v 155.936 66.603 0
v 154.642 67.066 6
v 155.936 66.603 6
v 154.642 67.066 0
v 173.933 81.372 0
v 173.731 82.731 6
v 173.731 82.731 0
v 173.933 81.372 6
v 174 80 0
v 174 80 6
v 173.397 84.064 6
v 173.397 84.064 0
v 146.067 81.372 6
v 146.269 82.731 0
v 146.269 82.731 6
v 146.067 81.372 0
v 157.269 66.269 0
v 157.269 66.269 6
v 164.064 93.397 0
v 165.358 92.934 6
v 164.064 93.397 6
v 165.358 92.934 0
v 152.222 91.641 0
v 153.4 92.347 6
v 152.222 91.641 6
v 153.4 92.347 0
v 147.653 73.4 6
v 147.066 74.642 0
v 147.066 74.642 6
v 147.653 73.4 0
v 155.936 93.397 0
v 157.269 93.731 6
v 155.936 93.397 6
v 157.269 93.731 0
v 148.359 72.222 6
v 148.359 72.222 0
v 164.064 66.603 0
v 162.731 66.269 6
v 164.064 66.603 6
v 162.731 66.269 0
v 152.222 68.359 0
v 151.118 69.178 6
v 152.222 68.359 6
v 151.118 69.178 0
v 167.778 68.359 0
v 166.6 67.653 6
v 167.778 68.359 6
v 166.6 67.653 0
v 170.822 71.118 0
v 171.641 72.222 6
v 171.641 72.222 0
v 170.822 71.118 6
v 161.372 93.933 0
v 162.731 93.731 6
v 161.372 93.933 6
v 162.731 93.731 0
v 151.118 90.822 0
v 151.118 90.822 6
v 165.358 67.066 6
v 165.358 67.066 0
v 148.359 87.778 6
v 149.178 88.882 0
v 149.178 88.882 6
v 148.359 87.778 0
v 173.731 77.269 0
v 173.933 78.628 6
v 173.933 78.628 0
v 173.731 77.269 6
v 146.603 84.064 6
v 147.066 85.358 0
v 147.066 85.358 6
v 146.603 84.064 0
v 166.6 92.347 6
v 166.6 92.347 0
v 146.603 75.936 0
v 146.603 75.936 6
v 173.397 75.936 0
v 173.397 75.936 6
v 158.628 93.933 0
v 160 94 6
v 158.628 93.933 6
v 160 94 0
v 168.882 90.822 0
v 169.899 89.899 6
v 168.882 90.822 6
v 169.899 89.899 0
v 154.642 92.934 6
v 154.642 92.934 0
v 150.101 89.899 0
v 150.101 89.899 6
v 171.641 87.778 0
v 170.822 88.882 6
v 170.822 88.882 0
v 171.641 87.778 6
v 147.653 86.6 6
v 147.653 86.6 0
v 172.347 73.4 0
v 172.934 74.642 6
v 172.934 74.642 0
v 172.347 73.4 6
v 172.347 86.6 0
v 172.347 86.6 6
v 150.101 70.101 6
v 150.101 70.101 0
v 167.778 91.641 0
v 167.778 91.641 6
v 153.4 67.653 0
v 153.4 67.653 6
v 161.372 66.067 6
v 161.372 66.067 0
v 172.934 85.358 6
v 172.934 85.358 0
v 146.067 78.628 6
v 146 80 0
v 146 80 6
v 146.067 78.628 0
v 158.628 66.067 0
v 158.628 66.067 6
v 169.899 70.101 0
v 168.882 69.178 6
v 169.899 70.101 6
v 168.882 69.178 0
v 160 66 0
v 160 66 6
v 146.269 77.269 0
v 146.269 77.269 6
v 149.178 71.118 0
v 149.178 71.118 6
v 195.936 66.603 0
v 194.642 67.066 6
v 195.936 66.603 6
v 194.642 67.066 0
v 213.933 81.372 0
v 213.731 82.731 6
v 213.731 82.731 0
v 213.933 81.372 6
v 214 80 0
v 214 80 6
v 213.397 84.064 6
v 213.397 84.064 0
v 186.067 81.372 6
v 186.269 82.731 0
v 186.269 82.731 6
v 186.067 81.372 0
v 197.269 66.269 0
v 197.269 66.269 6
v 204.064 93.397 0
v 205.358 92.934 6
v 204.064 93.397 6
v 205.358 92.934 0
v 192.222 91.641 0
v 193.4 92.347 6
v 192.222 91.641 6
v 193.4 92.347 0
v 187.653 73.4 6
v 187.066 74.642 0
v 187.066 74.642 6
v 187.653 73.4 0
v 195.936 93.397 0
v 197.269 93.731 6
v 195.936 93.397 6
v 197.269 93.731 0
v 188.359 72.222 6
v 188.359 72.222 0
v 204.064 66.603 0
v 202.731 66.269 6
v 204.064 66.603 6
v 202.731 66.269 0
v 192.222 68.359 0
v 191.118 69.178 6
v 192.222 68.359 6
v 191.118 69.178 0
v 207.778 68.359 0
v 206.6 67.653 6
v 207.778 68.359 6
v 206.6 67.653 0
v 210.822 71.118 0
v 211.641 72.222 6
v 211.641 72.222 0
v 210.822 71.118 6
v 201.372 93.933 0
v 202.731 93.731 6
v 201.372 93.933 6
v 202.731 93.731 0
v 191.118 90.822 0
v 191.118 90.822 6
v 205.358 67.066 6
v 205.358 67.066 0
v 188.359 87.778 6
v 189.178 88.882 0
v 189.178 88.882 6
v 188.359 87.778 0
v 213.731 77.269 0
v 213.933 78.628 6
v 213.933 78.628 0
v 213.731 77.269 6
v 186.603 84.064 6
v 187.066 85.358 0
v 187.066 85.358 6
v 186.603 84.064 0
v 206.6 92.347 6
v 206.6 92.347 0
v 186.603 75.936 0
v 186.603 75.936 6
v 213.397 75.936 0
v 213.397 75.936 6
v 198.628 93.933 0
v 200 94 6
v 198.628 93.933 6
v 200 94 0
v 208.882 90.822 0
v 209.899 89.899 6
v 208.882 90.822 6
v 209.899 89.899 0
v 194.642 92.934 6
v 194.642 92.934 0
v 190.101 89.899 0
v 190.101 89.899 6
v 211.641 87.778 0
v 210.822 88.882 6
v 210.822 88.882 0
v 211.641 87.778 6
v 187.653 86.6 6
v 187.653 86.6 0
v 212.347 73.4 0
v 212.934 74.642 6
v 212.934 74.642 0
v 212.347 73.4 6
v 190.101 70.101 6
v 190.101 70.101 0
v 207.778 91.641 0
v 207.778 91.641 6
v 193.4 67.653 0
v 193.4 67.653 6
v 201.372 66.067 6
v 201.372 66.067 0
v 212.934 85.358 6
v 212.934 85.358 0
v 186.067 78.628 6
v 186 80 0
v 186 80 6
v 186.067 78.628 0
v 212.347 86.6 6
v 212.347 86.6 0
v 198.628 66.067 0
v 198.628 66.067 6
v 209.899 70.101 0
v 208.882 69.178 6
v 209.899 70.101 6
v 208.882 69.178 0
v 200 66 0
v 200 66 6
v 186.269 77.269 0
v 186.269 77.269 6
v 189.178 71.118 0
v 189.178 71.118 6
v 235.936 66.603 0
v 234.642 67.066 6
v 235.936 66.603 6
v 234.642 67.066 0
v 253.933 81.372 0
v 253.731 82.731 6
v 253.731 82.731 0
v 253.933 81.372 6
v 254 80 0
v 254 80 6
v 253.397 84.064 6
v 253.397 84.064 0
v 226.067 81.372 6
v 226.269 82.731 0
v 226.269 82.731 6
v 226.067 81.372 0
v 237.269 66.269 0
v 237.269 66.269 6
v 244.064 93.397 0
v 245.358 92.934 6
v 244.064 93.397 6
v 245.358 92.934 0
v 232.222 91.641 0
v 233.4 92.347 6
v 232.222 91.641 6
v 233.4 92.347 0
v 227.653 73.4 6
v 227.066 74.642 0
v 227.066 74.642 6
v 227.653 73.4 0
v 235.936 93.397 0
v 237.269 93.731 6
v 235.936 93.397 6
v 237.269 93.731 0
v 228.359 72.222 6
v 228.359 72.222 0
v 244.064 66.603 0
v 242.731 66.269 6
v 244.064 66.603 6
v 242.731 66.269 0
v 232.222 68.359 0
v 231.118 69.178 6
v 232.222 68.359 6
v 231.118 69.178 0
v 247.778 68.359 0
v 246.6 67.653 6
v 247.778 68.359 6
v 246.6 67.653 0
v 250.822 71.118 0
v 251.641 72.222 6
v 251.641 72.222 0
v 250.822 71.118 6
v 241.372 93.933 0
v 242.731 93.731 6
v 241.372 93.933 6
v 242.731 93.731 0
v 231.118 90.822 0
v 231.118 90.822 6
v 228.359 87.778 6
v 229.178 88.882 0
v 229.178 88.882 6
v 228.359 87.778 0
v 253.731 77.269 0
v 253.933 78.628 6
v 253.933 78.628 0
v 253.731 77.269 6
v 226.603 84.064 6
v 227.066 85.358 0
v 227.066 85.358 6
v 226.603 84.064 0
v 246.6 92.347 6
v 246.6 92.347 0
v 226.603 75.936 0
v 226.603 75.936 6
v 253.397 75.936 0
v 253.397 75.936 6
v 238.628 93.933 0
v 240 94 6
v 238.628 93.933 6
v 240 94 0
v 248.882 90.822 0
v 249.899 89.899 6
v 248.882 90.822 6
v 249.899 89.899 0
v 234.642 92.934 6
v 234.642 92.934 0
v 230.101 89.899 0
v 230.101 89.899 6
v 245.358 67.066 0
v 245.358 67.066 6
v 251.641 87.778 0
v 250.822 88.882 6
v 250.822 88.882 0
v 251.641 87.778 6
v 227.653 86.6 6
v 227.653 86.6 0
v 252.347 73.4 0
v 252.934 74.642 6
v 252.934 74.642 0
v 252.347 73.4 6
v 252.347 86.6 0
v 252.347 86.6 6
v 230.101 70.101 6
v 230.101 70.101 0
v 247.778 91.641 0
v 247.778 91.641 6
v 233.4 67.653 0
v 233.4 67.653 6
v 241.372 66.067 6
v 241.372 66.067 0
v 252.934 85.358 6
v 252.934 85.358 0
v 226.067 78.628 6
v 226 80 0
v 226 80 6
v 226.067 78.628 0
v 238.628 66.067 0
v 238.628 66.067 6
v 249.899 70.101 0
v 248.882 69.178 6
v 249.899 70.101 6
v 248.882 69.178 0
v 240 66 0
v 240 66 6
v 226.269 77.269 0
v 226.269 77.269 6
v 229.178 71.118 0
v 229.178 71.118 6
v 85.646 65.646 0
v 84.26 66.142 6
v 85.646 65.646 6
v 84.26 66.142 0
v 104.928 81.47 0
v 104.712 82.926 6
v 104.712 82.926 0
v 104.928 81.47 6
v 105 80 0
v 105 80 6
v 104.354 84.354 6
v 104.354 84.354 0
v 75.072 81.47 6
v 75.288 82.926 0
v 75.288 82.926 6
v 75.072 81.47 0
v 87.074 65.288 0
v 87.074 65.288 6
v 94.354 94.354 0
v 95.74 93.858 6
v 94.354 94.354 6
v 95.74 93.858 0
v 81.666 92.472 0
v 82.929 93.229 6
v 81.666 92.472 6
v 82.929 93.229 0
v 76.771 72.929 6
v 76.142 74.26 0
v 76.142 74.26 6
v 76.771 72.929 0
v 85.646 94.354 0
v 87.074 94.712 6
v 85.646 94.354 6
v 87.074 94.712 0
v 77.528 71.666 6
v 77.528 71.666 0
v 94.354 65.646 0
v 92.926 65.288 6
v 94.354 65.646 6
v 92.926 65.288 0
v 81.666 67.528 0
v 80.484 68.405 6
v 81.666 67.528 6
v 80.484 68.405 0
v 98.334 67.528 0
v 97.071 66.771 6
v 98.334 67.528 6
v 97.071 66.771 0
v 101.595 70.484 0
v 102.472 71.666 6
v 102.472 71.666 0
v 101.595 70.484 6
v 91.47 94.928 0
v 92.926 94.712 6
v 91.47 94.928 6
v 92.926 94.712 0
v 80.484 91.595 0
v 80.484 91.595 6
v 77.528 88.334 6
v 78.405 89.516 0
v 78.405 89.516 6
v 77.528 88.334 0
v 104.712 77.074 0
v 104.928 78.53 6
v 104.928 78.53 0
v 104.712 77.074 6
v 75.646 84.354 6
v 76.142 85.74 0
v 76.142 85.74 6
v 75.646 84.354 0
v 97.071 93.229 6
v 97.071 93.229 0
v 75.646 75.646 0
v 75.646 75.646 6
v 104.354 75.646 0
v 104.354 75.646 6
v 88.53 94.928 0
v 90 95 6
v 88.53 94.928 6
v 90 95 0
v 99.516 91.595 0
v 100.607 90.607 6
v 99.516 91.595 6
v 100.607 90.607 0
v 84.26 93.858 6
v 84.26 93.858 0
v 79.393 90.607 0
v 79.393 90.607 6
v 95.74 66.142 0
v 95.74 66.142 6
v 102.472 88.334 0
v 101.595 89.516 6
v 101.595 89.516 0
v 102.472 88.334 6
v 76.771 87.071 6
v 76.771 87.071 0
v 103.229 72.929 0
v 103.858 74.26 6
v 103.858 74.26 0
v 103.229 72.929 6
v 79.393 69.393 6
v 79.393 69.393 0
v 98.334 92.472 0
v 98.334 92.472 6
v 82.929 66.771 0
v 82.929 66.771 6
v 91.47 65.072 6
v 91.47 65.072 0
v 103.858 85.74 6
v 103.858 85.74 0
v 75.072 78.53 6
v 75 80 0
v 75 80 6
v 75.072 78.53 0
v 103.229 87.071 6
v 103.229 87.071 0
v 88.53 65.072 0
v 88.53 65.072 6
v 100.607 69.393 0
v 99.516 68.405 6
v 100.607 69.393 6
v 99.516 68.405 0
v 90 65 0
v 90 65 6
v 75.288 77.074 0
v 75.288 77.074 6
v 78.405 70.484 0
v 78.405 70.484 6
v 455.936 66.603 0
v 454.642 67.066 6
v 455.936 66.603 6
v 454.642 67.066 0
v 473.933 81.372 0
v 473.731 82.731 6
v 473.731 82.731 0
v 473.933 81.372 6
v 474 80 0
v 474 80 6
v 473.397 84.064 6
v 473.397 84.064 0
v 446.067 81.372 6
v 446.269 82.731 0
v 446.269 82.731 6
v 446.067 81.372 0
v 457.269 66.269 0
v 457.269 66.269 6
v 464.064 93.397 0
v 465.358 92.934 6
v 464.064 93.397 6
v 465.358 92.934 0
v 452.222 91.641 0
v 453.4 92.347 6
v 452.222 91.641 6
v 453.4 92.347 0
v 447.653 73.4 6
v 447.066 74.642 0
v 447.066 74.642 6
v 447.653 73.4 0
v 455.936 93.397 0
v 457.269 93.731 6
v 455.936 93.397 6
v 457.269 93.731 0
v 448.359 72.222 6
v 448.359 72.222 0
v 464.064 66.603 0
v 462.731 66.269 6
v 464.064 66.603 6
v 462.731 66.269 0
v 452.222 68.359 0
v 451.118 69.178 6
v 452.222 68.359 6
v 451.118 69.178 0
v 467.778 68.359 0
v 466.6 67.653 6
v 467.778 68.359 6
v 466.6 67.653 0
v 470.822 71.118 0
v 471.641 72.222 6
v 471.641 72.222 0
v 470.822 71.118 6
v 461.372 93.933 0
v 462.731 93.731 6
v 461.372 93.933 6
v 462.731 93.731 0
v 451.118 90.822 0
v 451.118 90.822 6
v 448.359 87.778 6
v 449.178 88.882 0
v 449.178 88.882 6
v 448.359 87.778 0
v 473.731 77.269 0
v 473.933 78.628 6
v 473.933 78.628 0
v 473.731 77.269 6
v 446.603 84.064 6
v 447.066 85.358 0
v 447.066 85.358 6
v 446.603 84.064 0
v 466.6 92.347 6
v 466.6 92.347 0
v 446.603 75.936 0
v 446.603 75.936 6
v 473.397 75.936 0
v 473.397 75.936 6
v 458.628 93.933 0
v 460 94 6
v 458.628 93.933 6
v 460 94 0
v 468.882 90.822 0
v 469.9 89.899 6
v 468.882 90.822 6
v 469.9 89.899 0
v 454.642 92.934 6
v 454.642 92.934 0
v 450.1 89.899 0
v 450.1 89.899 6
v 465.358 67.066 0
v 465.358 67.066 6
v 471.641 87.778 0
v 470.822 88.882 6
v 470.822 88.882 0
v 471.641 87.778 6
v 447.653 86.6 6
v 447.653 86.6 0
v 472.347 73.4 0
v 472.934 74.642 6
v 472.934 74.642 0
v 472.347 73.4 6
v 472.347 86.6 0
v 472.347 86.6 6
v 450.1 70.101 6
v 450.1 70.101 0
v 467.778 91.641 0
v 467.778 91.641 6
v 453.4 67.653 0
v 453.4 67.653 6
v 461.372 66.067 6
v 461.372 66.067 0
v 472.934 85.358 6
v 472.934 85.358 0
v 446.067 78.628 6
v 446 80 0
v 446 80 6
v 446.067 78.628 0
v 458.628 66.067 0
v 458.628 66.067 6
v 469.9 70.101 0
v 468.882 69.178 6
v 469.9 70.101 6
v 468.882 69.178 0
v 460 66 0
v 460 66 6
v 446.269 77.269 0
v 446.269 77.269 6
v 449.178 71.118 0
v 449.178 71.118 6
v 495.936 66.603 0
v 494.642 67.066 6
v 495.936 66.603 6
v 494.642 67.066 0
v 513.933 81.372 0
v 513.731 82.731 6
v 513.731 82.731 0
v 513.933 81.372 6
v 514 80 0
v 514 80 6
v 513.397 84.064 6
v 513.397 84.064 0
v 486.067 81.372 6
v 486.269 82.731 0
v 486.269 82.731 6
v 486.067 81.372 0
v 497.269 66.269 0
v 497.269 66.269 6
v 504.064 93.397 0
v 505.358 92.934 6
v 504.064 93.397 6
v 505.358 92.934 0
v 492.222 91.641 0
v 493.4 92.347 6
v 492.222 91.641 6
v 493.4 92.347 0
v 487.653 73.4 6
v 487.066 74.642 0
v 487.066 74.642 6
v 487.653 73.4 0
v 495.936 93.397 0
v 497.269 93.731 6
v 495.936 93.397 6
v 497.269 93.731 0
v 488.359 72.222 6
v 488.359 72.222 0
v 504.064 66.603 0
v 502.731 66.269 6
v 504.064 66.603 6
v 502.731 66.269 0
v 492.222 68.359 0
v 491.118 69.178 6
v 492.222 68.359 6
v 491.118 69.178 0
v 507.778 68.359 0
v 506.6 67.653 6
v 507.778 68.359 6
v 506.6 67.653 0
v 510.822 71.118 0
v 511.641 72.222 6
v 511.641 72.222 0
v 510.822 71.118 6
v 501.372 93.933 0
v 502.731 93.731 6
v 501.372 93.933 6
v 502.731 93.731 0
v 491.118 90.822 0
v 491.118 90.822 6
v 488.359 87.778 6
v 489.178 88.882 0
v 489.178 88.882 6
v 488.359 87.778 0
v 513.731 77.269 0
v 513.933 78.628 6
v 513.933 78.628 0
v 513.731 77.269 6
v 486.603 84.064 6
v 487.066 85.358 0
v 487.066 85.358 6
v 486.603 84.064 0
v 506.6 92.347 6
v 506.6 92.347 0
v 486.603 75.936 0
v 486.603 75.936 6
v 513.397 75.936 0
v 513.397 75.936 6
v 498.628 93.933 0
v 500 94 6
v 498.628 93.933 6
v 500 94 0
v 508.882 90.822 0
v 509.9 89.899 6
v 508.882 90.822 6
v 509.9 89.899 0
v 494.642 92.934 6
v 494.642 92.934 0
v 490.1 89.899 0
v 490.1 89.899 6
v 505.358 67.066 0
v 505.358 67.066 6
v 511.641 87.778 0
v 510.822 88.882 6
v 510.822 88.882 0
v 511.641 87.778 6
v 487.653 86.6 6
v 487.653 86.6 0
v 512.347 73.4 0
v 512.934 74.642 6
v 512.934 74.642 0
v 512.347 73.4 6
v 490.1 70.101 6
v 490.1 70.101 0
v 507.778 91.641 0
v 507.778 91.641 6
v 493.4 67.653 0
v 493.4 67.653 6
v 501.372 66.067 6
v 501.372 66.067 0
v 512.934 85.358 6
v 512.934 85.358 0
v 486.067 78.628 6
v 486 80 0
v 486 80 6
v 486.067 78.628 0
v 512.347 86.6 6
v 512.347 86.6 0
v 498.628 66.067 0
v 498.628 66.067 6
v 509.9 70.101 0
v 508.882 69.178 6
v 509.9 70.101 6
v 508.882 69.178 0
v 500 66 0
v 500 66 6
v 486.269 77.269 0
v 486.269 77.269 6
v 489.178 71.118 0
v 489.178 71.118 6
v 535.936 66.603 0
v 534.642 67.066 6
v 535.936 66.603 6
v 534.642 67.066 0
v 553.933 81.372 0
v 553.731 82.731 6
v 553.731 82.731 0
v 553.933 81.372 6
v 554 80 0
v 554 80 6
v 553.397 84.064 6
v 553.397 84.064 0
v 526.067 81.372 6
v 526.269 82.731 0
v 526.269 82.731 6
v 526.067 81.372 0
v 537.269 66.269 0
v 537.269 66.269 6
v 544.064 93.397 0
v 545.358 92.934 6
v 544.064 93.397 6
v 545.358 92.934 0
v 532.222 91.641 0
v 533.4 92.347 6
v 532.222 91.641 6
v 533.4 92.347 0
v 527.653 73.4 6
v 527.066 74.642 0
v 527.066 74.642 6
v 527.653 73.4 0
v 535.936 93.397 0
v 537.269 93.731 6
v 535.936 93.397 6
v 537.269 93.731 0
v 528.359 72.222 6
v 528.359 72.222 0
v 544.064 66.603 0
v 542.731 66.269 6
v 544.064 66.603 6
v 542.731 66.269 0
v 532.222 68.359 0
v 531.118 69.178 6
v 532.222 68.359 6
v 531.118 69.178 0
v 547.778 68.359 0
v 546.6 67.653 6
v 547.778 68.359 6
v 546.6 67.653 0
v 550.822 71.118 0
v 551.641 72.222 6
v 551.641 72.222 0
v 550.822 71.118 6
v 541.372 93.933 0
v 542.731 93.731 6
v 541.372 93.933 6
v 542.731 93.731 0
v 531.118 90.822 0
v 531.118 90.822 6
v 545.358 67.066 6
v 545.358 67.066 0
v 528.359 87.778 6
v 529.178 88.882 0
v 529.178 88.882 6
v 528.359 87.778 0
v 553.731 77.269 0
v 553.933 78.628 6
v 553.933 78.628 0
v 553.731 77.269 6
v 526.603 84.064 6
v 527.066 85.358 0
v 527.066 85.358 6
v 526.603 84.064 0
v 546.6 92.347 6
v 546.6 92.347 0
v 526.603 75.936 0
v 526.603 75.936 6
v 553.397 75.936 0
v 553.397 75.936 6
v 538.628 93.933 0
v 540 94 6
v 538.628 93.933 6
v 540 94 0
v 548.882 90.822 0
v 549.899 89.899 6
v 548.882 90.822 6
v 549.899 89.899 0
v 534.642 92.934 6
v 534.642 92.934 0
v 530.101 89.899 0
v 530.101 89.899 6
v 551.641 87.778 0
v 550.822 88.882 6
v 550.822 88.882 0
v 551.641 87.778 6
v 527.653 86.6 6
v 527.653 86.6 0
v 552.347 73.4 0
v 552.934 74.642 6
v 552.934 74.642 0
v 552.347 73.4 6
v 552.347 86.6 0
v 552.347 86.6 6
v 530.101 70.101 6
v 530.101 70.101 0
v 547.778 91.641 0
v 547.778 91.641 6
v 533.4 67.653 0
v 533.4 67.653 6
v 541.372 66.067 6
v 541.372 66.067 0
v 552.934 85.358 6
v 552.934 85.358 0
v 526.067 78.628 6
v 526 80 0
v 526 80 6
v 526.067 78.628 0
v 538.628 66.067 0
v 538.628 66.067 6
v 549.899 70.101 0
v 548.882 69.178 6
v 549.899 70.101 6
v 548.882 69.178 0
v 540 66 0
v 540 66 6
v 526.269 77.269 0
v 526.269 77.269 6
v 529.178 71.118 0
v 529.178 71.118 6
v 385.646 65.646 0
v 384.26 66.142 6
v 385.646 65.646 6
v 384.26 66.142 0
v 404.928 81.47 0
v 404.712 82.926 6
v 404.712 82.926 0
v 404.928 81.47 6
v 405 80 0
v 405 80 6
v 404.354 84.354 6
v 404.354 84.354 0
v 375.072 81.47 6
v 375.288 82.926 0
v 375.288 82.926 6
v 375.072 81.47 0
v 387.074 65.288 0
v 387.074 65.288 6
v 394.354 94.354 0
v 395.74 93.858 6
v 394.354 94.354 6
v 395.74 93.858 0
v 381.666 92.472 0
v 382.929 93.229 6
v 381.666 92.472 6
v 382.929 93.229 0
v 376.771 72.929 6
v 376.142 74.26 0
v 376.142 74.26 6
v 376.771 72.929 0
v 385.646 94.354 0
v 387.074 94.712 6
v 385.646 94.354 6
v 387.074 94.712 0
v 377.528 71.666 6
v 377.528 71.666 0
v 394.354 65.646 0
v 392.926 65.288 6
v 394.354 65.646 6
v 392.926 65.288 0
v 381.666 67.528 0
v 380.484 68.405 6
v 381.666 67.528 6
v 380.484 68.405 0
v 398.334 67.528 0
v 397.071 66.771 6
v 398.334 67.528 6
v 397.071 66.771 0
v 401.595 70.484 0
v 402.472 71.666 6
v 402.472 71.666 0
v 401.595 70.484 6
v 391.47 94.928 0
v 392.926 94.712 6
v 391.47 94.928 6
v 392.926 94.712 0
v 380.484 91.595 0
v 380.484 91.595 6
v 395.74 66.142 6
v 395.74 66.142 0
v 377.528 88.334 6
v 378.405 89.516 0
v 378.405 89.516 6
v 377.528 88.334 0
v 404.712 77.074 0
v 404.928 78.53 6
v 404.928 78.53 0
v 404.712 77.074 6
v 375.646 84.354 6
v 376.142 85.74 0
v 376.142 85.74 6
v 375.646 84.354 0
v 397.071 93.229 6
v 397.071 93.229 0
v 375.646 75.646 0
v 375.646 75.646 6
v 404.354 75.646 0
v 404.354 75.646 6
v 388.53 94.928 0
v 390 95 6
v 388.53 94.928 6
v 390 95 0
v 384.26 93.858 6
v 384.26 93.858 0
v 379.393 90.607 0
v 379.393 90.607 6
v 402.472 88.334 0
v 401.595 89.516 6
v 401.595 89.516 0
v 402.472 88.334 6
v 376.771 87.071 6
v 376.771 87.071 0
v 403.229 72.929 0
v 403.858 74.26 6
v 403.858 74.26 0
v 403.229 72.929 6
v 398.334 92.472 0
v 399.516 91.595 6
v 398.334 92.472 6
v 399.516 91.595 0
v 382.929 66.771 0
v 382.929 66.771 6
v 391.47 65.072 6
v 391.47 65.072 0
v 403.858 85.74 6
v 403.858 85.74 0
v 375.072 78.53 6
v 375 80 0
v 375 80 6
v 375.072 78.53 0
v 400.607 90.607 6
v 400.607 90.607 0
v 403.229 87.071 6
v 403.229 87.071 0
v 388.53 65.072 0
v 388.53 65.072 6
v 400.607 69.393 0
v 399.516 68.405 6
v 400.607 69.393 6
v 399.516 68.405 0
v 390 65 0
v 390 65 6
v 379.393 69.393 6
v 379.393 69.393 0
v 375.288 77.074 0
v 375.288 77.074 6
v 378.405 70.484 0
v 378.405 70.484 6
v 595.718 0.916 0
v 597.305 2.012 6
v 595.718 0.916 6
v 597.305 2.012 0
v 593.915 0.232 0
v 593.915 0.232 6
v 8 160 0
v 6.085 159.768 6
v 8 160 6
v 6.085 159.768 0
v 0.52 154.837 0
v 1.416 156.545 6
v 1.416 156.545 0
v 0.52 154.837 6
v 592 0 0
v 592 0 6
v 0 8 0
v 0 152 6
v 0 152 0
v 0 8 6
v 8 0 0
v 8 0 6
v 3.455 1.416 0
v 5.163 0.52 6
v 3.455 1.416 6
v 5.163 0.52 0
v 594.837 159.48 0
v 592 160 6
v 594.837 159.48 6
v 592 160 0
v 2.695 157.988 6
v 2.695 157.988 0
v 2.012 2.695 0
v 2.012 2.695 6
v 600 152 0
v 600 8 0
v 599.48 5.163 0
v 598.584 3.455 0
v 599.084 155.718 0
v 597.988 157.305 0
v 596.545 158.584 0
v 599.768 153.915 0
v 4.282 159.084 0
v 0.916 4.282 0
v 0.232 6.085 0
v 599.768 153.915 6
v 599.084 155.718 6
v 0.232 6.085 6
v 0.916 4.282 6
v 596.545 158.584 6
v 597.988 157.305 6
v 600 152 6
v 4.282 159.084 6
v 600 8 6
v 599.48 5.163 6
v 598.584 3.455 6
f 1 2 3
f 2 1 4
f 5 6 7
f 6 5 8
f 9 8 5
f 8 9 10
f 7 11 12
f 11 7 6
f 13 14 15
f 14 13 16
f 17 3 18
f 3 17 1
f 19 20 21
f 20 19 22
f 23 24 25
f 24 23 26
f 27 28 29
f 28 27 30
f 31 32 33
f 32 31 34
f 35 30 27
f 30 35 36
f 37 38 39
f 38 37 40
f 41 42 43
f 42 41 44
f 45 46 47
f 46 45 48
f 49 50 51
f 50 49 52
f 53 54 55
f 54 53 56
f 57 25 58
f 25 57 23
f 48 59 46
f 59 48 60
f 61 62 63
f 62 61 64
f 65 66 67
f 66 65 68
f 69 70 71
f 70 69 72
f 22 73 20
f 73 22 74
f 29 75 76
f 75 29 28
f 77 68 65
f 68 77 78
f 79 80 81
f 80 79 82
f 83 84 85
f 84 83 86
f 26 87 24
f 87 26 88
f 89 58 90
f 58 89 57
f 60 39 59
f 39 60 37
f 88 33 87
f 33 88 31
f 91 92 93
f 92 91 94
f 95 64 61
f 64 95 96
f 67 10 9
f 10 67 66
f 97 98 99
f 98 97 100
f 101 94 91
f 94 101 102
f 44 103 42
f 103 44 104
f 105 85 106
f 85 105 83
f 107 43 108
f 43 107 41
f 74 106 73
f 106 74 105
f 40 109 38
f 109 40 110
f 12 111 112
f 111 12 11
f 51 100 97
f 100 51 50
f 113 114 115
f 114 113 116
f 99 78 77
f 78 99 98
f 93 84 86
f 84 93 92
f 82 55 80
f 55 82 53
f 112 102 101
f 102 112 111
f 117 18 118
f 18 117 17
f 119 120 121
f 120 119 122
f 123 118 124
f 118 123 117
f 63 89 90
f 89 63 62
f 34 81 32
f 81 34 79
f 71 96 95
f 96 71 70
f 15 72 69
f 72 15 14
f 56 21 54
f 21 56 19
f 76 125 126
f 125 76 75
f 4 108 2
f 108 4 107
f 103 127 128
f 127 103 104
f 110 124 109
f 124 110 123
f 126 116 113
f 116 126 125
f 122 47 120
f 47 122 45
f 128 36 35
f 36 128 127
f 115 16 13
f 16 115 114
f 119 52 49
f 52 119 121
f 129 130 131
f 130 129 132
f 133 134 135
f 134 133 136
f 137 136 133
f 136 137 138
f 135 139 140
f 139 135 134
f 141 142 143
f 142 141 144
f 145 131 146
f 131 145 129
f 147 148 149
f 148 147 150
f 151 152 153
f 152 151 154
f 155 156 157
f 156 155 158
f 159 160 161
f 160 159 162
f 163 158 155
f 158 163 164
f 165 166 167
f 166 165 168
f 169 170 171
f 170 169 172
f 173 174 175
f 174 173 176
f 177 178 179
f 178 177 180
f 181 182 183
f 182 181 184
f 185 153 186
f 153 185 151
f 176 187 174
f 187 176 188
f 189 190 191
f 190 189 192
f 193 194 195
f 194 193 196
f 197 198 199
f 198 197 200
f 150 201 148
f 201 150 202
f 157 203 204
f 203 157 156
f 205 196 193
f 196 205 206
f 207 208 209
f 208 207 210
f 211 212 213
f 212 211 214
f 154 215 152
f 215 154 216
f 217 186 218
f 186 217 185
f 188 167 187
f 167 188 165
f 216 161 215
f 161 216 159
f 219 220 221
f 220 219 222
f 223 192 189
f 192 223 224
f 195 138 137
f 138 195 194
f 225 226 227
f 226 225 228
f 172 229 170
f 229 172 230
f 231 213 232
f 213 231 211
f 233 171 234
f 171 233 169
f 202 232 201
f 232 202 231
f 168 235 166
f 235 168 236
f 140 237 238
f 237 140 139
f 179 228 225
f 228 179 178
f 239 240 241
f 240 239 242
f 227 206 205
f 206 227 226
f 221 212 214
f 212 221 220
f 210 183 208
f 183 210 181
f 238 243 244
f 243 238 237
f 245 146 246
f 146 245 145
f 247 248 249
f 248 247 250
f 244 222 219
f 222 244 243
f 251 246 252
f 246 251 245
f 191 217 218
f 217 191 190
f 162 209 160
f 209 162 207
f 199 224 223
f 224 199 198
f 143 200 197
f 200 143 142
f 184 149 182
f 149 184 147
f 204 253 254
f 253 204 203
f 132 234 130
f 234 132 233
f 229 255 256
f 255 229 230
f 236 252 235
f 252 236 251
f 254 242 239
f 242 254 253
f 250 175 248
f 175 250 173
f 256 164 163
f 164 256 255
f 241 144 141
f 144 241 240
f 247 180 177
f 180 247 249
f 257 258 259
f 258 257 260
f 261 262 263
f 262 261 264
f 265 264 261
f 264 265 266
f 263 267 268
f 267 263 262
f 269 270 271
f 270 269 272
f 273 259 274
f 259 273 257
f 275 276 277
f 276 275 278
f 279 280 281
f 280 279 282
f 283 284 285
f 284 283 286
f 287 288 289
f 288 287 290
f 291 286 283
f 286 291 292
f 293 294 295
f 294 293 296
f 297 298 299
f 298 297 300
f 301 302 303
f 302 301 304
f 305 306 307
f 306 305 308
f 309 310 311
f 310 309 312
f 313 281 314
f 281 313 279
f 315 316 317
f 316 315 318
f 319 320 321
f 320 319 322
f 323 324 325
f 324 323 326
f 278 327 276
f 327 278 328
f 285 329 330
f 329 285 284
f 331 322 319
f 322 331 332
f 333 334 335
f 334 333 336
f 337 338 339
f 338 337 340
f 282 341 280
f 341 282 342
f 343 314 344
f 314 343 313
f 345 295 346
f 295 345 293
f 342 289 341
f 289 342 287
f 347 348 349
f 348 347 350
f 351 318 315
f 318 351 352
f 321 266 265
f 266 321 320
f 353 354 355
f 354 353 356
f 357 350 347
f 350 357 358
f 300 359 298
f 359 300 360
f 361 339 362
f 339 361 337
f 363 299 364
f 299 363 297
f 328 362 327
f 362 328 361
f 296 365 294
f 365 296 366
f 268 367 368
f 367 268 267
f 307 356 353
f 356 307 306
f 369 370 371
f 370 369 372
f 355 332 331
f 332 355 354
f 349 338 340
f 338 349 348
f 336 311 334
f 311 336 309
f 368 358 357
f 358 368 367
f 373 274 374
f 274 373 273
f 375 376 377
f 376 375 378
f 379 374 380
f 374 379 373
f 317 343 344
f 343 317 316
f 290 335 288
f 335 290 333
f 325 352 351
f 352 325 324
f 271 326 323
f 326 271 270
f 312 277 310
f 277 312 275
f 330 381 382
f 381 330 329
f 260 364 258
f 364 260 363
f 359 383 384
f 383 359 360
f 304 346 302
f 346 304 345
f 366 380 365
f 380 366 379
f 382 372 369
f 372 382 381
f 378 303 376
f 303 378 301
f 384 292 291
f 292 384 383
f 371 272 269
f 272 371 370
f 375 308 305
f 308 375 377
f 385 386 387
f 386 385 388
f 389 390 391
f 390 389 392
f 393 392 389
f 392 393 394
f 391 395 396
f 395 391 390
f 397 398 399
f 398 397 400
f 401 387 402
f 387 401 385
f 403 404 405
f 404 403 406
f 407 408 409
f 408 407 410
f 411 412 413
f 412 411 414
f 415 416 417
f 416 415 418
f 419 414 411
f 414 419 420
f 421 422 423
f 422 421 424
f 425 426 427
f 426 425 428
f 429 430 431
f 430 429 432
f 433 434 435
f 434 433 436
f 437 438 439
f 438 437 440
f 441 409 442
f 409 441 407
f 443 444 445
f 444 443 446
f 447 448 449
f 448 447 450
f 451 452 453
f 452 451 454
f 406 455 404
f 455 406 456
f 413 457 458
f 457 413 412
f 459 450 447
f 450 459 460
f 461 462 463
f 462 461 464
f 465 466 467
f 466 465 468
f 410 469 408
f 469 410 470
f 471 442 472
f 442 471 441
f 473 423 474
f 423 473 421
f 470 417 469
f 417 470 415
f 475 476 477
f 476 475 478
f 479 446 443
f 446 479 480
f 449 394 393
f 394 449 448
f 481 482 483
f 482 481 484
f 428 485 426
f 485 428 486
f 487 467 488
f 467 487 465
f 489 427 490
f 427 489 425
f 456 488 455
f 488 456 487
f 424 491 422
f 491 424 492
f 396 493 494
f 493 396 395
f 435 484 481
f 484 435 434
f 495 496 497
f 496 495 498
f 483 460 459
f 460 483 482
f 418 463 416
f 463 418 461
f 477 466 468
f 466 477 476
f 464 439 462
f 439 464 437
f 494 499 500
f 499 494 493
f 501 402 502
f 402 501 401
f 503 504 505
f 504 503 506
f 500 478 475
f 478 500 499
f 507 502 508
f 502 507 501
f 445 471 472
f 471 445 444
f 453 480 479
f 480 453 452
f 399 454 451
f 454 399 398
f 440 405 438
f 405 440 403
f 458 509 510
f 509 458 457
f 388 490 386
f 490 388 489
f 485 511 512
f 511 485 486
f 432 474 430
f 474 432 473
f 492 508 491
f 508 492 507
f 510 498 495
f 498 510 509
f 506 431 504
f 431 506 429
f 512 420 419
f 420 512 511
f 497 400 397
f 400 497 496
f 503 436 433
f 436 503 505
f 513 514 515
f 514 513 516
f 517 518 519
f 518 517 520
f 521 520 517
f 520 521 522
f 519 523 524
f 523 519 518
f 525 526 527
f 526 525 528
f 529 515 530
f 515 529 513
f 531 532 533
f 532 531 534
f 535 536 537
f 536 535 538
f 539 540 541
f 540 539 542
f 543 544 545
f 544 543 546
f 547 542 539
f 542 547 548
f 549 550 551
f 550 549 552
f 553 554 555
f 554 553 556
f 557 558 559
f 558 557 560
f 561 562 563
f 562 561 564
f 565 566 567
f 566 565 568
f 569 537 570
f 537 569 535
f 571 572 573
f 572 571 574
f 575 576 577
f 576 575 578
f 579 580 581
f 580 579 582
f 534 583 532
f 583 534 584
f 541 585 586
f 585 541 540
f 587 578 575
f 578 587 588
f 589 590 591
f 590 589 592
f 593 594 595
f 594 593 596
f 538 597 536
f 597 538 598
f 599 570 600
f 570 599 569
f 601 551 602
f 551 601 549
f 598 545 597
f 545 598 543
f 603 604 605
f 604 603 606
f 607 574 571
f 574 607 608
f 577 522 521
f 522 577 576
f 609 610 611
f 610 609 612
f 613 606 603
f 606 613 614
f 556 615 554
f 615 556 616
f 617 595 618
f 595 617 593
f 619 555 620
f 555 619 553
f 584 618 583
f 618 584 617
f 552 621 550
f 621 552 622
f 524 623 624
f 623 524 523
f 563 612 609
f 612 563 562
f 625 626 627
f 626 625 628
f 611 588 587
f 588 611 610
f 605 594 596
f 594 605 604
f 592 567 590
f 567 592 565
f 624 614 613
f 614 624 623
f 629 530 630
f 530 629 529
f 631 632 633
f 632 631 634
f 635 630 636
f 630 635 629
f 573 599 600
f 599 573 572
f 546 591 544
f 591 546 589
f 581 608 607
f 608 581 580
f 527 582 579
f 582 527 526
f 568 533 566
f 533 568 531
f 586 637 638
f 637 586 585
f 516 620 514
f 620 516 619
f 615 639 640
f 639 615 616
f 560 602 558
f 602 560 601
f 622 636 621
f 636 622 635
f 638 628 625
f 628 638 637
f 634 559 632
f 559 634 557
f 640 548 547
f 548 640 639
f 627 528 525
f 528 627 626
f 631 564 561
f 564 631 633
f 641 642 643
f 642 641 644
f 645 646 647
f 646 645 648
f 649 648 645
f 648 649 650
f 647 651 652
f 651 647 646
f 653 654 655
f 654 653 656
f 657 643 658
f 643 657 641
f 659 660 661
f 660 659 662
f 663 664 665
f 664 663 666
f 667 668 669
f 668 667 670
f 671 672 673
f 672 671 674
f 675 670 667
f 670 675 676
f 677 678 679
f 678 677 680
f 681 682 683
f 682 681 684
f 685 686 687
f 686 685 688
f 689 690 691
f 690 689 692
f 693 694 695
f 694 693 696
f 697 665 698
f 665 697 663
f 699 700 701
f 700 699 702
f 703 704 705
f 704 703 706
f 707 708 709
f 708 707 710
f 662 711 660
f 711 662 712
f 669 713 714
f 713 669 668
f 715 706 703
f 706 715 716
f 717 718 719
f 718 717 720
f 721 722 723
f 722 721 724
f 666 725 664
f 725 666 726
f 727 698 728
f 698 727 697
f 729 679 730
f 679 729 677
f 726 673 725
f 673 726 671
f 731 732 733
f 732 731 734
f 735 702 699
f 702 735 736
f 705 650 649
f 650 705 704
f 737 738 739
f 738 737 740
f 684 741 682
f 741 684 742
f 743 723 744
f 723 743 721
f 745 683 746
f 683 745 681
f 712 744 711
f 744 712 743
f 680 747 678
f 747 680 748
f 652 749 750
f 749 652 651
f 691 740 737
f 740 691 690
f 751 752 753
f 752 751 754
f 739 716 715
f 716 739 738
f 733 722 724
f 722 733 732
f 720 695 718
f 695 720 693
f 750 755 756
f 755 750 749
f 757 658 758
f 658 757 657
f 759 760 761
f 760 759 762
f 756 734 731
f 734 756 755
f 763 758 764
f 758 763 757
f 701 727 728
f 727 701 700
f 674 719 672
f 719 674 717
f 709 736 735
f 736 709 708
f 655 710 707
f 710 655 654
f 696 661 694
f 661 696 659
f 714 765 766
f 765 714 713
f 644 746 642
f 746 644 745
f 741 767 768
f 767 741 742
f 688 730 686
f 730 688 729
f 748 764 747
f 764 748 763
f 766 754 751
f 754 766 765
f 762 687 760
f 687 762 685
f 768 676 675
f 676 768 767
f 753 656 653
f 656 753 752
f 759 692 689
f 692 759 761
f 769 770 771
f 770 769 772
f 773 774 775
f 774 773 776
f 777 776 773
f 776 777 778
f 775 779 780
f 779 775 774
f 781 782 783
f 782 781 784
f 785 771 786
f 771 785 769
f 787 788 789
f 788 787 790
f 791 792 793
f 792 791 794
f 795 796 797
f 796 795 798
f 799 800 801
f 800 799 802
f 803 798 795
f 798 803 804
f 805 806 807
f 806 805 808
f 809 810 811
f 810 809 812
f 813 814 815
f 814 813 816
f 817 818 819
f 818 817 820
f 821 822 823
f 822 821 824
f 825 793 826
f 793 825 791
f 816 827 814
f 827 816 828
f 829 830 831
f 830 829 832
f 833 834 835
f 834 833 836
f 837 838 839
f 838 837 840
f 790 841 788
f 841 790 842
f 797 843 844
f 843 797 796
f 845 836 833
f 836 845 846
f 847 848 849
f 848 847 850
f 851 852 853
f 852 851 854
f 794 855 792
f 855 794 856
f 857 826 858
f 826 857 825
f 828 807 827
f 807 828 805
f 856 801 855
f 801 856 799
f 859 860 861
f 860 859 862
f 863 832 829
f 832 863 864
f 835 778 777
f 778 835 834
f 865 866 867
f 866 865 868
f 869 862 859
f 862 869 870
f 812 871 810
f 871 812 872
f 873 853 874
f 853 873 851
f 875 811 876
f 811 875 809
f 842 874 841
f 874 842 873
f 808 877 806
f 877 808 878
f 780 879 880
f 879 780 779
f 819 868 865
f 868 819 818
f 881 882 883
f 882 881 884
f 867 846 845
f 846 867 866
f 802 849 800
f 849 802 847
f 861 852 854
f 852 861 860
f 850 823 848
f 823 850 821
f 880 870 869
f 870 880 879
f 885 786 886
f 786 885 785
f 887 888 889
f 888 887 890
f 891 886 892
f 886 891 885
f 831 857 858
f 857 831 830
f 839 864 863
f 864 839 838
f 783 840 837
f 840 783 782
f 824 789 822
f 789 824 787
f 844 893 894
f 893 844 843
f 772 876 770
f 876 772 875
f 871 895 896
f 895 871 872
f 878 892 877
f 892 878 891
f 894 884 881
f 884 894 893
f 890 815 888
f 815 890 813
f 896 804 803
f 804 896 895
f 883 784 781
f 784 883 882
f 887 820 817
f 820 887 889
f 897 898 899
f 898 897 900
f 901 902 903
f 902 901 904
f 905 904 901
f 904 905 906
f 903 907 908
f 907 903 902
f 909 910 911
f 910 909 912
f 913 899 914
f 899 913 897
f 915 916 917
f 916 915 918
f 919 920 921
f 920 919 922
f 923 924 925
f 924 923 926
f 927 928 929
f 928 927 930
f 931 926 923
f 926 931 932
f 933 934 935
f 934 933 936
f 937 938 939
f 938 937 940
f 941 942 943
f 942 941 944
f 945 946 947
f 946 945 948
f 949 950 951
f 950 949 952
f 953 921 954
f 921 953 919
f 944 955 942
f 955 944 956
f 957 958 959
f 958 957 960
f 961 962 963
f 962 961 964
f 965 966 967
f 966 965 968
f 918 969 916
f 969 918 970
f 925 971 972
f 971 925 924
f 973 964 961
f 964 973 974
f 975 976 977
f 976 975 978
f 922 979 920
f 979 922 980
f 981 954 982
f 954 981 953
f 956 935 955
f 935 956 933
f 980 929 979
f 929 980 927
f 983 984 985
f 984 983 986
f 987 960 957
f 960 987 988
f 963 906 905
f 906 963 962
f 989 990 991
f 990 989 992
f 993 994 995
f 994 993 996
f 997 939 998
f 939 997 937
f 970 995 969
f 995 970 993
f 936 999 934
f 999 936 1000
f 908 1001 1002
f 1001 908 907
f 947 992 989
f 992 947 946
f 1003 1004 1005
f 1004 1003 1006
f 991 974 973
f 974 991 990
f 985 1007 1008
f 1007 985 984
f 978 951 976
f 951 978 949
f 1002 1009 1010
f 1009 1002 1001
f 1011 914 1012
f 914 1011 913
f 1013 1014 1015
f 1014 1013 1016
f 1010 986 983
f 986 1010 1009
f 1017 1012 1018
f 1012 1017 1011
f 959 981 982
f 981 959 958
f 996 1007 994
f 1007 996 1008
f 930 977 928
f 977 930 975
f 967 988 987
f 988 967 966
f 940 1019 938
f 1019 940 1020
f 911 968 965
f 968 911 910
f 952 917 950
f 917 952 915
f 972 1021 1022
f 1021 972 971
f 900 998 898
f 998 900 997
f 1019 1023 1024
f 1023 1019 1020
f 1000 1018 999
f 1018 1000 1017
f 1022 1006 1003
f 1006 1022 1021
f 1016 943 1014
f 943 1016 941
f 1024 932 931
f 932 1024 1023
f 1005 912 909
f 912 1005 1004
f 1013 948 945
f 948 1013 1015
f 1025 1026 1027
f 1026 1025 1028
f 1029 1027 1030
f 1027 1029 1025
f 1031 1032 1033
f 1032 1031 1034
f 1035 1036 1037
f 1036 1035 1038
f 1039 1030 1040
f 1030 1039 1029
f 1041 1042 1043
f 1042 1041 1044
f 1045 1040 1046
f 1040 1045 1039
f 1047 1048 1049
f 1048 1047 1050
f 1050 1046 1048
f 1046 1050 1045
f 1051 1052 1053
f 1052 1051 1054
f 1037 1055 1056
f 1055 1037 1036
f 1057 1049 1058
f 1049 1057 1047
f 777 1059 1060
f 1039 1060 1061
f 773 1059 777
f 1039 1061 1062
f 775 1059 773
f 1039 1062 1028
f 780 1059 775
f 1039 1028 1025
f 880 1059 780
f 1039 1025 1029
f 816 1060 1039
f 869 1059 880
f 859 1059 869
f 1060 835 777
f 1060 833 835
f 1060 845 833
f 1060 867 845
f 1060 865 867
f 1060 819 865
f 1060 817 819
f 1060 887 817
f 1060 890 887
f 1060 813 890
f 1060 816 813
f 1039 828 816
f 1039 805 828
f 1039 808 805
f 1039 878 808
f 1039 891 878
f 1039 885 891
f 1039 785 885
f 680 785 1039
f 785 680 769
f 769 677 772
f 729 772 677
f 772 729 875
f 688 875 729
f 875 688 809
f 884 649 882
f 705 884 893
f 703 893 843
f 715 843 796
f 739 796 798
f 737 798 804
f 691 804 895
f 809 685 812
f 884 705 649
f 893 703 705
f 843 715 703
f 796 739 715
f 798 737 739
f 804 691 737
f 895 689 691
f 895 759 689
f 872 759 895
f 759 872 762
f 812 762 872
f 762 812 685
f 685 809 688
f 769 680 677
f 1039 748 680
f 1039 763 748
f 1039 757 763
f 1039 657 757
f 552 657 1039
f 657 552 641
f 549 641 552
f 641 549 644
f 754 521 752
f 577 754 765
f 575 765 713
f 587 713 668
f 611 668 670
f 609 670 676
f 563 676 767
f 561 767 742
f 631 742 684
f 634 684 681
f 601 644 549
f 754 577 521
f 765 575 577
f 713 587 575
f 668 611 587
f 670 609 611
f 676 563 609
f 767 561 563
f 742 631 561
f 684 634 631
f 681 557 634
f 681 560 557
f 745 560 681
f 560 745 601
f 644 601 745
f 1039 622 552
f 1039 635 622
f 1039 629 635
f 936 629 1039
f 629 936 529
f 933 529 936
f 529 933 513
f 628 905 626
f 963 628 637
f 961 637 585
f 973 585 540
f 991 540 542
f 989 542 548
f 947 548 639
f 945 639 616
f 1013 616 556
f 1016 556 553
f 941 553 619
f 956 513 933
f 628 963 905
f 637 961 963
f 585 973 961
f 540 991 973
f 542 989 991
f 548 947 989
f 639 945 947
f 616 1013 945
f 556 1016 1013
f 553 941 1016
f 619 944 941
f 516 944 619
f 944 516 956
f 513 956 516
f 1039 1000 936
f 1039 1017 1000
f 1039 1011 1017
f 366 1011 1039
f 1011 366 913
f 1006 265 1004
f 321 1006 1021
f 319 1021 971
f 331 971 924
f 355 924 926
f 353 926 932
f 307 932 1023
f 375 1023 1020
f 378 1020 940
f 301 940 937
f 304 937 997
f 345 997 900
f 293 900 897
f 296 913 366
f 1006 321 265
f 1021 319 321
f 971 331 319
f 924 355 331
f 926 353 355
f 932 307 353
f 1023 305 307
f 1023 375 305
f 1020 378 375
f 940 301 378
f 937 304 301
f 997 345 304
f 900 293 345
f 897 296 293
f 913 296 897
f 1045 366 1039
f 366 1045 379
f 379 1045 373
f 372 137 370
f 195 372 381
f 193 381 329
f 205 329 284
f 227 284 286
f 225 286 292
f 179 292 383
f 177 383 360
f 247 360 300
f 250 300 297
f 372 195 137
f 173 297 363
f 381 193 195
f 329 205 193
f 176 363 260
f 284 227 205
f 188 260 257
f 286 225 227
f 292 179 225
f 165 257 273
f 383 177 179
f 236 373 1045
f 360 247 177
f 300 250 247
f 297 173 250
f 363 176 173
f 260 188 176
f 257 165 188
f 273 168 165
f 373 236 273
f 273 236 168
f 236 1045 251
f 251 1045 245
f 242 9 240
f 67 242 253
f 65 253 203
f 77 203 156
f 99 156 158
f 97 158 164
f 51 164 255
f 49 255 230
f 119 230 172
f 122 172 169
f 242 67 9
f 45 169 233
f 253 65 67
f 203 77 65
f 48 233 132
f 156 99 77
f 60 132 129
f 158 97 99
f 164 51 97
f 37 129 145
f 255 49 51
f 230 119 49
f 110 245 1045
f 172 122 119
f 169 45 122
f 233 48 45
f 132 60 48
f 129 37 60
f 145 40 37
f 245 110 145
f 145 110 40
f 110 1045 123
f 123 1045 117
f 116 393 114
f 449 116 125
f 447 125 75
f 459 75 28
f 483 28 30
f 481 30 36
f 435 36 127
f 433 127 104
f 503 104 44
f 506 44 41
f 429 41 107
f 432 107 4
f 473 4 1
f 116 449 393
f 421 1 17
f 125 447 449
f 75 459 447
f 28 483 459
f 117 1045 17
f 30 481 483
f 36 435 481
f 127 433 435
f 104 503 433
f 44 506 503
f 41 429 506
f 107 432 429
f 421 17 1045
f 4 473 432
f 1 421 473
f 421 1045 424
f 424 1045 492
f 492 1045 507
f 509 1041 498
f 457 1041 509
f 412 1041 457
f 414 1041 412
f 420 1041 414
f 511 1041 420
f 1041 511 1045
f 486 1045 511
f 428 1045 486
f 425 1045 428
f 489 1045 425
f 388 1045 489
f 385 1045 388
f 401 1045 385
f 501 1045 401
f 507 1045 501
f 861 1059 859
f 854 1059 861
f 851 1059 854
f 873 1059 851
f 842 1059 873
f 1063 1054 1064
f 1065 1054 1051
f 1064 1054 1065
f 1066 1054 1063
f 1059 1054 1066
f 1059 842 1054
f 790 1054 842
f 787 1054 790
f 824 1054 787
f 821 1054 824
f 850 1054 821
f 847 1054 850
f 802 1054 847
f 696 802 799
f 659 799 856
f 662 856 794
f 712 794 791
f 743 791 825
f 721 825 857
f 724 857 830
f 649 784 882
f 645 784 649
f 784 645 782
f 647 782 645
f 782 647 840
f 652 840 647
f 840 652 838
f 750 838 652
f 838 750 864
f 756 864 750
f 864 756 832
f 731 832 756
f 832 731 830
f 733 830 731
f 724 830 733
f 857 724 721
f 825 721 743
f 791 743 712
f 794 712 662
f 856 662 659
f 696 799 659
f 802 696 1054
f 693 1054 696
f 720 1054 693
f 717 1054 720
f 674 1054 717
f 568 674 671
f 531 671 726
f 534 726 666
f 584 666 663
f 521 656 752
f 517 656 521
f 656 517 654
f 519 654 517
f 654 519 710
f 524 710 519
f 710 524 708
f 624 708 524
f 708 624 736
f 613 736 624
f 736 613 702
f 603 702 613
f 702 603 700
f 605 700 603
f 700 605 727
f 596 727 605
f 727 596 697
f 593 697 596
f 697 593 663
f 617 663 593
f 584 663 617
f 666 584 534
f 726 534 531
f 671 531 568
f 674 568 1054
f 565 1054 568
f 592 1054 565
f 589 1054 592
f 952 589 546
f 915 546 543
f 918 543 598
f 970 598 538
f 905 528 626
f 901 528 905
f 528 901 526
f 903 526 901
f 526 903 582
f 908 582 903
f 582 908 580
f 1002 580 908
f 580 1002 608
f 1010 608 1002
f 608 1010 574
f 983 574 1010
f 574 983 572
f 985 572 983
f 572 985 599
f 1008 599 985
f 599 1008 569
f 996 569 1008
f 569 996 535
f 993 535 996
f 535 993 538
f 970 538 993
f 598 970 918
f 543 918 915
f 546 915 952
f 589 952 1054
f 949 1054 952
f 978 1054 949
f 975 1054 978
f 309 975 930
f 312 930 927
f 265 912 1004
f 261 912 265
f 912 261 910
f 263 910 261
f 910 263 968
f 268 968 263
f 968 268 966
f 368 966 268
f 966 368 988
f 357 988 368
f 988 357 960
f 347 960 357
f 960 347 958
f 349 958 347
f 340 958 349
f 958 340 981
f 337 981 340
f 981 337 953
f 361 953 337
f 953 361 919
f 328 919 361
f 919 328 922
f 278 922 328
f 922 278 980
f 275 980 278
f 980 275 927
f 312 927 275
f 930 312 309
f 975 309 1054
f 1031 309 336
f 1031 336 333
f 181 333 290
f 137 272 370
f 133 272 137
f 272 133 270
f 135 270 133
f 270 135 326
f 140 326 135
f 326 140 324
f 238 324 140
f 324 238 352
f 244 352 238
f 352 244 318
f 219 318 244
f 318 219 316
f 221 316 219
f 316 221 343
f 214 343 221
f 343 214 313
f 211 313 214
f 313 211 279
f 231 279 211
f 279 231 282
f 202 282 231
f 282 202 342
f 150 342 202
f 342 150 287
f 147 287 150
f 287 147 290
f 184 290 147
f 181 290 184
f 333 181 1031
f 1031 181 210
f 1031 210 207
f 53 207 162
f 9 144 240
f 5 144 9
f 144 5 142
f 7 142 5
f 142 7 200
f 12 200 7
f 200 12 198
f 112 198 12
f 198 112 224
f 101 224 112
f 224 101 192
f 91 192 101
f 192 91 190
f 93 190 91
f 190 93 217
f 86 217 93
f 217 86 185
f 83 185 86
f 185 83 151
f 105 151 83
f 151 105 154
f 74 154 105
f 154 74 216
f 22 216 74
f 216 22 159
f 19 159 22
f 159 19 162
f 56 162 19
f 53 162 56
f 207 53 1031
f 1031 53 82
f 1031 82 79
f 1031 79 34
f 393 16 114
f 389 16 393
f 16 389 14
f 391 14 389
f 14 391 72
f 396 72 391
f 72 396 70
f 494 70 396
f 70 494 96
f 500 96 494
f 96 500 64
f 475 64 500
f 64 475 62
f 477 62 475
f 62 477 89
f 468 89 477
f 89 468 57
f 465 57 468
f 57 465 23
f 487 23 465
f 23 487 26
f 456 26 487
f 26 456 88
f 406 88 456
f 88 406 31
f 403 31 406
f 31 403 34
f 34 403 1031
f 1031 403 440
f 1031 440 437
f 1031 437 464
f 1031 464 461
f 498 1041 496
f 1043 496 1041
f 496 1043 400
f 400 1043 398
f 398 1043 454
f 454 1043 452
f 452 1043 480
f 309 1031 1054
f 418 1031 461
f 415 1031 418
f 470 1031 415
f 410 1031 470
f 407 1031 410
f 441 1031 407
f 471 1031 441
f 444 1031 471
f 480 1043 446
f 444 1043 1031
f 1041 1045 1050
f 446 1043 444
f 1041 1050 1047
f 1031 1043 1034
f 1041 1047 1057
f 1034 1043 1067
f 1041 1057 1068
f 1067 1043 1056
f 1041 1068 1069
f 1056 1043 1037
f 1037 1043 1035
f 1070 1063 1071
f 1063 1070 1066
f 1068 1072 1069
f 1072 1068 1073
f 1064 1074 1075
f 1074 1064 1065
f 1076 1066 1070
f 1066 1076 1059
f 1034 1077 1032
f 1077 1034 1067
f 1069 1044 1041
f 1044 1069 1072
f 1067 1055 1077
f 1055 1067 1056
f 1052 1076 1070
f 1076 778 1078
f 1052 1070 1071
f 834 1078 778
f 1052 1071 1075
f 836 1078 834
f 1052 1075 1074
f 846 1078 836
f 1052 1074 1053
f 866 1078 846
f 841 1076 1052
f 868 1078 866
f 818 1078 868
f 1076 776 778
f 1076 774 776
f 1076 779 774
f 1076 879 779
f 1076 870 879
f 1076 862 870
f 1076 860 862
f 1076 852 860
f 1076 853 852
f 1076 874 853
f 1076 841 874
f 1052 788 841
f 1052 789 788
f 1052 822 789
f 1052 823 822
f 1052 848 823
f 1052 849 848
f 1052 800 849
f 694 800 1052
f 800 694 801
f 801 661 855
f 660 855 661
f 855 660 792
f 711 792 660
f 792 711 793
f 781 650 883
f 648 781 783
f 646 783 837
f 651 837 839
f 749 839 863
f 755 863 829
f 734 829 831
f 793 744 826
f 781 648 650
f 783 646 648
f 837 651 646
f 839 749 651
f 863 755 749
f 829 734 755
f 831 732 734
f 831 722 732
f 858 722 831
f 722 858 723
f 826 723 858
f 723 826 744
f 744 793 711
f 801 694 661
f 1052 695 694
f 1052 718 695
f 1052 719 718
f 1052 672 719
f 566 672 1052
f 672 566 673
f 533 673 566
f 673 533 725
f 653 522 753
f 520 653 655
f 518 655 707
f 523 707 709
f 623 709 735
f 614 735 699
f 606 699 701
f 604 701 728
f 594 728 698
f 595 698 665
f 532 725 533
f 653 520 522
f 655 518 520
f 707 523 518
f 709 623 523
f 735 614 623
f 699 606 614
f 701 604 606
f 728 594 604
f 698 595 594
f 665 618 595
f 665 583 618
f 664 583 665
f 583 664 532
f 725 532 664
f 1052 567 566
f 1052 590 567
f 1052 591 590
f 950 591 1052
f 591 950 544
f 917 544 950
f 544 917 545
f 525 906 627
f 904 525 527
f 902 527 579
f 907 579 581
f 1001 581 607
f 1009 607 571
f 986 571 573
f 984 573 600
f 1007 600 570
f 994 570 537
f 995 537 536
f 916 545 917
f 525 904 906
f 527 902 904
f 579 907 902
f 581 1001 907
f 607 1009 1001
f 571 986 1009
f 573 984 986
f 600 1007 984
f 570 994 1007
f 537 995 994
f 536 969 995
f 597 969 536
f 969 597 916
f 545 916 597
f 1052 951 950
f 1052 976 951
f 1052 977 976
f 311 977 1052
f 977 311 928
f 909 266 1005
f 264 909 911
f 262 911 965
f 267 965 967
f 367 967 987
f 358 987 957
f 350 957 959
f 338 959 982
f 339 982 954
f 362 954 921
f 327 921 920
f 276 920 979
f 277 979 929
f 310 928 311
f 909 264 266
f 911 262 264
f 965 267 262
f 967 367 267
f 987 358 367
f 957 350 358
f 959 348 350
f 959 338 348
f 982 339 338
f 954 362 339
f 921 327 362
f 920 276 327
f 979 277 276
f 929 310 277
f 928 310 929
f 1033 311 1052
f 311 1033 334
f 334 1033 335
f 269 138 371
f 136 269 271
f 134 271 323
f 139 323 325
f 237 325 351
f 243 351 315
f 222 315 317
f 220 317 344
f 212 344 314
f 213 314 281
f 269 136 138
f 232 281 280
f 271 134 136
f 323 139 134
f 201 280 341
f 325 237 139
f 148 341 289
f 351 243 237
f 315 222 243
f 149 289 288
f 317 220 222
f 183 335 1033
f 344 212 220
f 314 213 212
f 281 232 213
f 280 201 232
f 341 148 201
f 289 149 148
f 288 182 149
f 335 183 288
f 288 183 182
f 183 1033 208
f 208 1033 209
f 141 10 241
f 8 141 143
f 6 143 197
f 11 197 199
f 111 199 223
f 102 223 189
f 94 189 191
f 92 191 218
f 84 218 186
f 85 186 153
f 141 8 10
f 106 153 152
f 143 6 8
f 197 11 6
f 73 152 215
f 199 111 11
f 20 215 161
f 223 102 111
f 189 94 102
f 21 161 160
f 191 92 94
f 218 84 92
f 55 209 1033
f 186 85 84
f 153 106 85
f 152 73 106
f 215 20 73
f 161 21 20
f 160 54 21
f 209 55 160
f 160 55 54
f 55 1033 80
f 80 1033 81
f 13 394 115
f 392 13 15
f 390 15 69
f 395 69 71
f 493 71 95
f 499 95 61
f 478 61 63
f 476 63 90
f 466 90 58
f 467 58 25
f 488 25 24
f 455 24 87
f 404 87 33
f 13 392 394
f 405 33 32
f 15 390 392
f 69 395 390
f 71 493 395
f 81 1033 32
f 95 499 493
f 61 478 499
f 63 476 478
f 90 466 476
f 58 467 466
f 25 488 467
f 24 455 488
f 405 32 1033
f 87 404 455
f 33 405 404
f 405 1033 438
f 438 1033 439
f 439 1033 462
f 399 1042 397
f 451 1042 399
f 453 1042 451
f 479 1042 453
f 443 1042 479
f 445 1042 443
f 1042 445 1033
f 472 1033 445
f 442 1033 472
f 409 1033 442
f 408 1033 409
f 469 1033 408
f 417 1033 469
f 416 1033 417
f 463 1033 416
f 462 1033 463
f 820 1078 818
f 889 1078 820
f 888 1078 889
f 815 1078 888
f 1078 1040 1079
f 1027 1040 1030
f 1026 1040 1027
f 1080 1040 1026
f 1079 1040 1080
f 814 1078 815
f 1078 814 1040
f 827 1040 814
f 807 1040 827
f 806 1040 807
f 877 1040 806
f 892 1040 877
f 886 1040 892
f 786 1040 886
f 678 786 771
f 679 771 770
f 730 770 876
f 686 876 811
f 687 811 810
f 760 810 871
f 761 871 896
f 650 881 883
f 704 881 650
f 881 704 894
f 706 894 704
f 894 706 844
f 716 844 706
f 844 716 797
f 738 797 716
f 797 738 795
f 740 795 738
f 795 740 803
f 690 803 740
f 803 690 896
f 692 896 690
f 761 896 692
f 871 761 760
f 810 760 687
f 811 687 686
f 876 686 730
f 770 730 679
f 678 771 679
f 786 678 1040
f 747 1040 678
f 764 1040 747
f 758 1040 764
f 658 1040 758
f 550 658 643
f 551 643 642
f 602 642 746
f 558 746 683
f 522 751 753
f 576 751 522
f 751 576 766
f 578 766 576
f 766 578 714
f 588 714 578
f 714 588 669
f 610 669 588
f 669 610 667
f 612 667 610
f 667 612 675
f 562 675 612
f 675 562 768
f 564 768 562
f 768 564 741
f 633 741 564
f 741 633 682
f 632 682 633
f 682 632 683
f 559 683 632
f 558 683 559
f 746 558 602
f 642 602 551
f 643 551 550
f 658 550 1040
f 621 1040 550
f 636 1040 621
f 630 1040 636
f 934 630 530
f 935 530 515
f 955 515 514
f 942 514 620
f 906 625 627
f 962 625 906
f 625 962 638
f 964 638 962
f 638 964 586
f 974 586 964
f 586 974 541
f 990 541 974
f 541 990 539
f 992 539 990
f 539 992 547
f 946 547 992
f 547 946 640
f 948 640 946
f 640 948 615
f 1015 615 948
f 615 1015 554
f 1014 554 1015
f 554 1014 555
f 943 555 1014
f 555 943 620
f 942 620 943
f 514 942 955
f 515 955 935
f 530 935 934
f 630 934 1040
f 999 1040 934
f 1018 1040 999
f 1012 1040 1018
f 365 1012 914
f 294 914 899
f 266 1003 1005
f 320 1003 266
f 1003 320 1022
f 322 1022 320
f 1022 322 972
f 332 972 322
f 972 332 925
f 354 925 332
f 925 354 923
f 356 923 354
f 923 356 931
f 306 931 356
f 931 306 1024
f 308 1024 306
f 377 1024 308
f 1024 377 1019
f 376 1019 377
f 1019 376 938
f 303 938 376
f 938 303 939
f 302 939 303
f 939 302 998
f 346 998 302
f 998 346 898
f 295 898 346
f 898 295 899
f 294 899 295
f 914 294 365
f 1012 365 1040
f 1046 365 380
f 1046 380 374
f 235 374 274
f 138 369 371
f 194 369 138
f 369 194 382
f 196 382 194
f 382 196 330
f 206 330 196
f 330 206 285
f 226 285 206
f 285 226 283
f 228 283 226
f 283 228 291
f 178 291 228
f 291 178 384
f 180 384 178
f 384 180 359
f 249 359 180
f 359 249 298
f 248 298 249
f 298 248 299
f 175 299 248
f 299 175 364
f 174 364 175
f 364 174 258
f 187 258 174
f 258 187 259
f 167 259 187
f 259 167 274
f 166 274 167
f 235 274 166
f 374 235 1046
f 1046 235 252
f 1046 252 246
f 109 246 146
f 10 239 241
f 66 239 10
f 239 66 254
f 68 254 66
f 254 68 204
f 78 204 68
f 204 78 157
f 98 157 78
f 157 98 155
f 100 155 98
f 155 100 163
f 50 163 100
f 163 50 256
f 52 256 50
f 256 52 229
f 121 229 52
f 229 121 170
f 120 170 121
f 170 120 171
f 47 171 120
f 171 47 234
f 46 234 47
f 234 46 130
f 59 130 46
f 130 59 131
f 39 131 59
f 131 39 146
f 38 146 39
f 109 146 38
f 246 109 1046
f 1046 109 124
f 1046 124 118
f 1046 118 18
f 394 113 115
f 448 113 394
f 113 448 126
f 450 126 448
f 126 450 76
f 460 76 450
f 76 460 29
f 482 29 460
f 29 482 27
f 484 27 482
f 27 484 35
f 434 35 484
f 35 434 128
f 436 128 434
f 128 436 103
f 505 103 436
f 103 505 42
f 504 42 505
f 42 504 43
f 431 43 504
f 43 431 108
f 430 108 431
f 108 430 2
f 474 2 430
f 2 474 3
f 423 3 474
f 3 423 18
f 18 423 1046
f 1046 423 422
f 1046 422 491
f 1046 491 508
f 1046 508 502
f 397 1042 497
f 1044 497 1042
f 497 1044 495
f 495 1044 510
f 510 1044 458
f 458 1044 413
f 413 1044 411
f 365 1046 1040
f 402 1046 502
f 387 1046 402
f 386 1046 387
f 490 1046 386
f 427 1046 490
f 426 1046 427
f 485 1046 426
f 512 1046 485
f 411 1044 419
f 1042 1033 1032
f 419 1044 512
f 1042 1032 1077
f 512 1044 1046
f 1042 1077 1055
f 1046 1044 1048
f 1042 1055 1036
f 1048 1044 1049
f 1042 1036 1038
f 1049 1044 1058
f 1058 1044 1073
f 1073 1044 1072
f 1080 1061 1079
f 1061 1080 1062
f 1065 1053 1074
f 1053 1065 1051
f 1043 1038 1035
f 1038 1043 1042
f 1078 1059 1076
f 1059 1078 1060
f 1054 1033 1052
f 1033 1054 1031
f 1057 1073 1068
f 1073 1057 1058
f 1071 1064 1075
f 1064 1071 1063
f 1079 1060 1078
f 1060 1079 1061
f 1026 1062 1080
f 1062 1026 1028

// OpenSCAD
// Arcade control panel: a concept, UNVALIDATED.
//
// Nothing here has been printed, cut, fitted or tested. Every size is a named parameter and
// every default below is a placeholder, not a measurement: replace each one with the value
// measured on your own joysticks, buttons, encoder and table before using this for anything.
// The panel is a flat plate with holes; it carries no load-rated, food-contact or mains part.
//
// Open in OpenSCAD, set the parameters, F5 to preview, F6 to render.

/* [Panel: from your table, measured] */
panel_width = 600;        // placeholder: the near edge you have, in mm
panel_depth = 160;        // placeholder
panel_thickness = 6;      // placeholder: the sheet you will use
corner_radius = 8;        // placeholder

/* [Joysticks: from the joystick you buy, measured] */
players = 2;
joystick_shaft_hole = 30;     // placeholder: the hole the joystick's datasheet asks for
joystick_mount_spacing_x = 0; // placeholder: 0 leaves the mounting holes out until measured
joystick_mount_spacing_y = 0; // placeholder
joystick_mount_hole = 0;      // placeholder

/* [Buttons: from the buttons you buy, measured] */
buttons_per_player = 3;
button_hole = 28;         // placeholder: the hole the button's datasheet asks for
button_pitch = 40;        // placeholder: center to center
button_offset_x = 70;     // placeholder: first button from the joystick center

/* [Layout] */
joystick_x_fraction = 0.3; // placeholder: the joystick's place across a player's zone
cut_margin = 1;           // how far each hole reaches past the plate's faces, so cuts go through
player_zone = panel_width / players;
row_y = panel_depth / 2;

echo("arcade_panel.scad: UNVALIDATED concept; every size is a placeholder until measured");

module plate() {
  linear_extrude(height = panel_thickness)
    offset(r = corner_radius) offset(delta = -corner_radius)
      square([panel_width, panel_depth]);
}

module player_holes(x0) {
  jx = x0 + player_zone * joystick_x_fraction;
  translate([jx, row_y, -cut_margin]) cylinder(d = joystick_shaft_hole, h = panel_thickness + 2 * cut_margin, $fn = 64);
  if (joystick_mount_hole > 0 && joystick_mount_spacing_x > 0 && joystick_mount_spacing_y > 0)
    for (sx = [-1, 1], sy = [-1, 1])
      translate([jx + sx * joystick_mount_spacing_x / 2, row_y + sy * joystick_mount_spacing_y / 2, -cut_margin])
        cylinder(d = joystick_mount_hole, h = panel_thickness + 2 * cut_margin, $fn = 24);
  for (i = [0 : buttons_per_player - 1])
    translate([jx + button_offset_x + i * button_pitch, row_y, -cut_margin])
      cylinder(d = button_hole, h = panel_thickness + 2 * cut_margin, $fn = 64);
}

difference() {
  plate();
  for (p = [0 : players - 1]) player_holes(p * player_zone);
}
